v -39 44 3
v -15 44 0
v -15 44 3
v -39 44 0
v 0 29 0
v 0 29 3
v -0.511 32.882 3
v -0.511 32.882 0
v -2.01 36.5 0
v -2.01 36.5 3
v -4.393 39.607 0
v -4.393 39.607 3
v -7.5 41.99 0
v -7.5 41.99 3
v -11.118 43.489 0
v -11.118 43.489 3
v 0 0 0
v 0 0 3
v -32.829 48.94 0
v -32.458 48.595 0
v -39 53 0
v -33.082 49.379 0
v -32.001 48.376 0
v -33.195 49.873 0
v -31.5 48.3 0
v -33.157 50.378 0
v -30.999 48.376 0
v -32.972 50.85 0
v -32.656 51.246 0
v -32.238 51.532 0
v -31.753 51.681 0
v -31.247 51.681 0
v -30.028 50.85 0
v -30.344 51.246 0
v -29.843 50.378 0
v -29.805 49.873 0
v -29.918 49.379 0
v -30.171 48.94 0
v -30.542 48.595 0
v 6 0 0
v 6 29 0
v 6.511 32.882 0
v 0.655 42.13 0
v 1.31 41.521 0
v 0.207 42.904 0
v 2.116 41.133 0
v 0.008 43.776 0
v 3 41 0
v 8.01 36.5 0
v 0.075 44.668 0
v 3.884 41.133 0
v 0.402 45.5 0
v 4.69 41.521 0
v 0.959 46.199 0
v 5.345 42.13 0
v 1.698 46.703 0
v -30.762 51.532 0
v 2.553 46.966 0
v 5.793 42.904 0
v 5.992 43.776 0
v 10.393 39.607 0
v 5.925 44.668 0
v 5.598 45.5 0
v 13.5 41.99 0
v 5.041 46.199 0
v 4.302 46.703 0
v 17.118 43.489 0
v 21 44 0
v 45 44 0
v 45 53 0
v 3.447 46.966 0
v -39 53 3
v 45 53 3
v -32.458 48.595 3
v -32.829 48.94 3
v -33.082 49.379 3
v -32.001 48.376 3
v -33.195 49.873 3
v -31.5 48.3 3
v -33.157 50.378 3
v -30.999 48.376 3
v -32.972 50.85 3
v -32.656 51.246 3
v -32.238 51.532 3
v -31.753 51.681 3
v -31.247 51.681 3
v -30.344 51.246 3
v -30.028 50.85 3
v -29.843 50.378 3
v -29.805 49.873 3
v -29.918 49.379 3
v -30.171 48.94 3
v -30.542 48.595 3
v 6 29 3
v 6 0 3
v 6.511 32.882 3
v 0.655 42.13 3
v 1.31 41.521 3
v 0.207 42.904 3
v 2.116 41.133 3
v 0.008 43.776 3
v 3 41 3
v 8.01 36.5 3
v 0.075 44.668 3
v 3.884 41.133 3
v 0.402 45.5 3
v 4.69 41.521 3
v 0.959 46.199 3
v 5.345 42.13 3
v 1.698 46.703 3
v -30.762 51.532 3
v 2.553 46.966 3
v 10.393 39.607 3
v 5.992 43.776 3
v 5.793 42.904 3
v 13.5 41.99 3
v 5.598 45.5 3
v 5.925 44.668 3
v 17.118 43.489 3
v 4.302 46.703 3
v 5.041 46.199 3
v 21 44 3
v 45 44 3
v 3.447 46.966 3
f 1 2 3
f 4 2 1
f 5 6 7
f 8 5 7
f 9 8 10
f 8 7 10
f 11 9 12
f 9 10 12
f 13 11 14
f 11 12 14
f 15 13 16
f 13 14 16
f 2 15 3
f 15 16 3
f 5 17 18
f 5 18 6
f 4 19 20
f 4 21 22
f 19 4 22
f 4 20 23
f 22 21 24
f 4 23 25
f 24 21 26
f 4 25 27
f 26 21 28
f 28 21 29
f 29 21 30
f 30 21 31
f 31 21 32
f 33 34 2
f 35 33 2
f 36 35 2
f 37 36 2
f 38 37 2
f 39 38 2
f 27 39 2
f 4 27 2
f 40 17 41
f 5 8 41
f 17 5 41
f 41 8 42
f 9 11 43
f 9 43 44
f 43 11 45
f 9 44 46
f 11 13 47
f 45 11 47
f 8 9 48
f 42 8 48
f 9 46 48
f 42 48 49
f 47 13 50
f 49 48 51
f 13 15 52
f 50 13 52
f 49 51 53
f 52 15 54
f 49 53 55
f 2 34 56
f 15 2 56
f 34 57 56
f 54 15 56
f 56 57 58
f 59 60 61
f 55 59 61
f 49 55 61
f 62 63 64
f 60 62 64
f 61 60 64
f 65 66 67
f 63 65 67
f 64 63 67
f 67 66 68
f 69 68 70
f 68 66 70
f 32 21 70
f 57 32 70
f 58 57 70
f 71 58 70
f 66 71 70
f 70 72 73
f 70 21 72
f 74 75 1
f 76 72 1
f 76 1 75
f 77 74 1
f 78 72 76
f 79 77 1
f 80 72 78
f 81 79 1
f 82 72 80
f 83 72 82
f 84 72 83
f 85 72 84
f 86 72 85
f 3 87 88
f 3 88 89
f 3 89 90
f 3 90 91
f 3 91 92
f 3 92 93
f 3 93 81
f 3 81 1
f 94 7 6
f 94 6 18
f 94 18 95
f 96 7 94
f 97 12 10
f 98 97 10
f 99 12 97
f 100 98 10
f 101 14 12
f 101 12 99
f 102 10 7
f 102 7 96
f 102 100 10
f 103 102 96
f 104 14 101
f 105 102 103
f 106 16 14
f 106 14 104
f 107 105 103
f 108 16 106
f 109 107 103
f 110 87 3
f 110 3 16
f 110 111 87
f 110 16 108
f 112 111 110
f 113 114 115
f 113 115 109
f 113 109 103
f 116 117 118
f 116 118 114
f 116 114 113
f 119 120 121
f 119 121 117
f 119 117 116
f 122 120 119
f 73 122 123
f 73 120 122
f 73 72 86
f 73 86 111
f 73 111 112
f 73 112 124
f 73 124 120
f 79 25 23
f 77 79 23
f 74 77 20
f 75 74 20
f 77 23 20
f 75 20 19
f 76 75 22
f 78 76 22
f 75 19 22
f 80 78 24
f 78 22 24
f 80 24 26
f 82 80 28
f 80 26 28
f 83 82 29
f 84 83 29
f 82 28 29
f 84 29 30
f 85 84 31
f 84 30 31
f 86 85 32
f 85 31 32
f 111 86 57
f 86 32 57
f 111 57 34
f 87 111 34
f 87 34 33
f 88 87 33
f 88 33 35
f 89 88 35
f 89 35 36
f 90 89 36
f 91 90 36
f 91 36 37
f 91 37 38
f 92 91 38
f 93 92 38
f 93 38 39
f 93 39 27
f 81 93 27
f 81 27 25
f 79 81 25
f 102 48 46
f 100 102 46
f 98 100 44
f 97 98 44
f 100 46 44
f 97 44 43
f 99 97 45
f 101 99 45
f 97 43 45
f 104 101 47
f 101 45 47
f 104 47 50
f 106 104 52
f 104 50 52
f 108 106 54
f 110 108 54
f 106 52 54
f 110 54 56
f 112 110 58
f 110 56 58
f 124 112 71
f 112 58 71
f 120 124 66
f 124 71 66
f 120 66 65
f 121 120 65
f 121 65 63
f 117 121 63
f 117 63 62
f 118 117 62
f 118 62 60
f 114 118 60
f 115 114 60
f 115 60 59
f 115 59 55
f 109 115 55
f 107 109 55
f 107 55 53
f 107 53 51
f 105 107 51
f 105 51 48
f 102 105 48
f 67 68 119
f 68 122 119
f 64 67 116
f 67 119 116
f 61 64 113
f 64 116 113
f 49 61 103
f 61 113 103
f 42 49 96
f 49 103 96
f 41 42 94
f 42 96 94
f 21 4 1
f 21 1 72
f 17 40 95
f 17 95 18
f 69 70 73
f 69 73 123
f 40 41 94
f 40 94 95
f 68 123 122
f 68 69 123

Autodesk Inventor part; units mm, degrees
ref_plane "YZ Plane" through (0, 0, 0) normal (1, 0, 0) x (0, 1, 0)
ref_plane "XZ Plane" through (0, 0, 0) normal (0, 1, 0) x (-1, 0, 0)
ref_plane "XY Plane" through (0, 0, 0) normal (0, 0, 1) x (1, 0, 0)
sketch "Sketch1" plane through (0, 0, 0) normal (0, 0, 1) x (1, 0, 0)
  line L0 (-39, 53) -> (6, 53)
  line L1 (6, 53) -> (6, 44)
  line L2 (6, 44) -> (-39, 44)
  line L3 (-39, 44) -> (-39, 53)
  line L4 (0, 44) -> (6, 44)
  line L5 (6, 44) -> (6, 0)
  line L6 (6, 0) -> (0, 0)
  line L7 (0, 0) -> (0, 44)
  line L8 (6, 53) -> (45, 53)
  line L9 (45, 53) -> (45, 44)
  line L10 (45, 44) -> (6, 44)
  line L11 (6, 44) -> (6, 53)
  dimension "d1" = 9
  dimension "d2" = 45
  dimension "d3" = 6
  dimension "d17" = 53
  dimension "d19" = 45
extrude "Extrusion1" add sketch "Sketch1" along normal blind 3
fillet "Fillet1" radius 15 2 edges at (0, 44, 1.5) (6, 44, 1.5)
sketch "Sketch2" plane through (0, 0, 3) normal (0, 0, 1) x (1, 0, 0)
  line L0 (45, 53) -> (-39, 53) projected
  line L1 (6, 0) -> (6, 29) projected
  point P0 (0, 0)
  point P1 (3, 44)
  point P2 (6, 44)
  point P3 (-15, 44)
  dimension "d20" = 3
hole "Hole1" at (3, 44, 3) direction (0, 0, -1) diameter 6 end through all
sketch "Sketch3" plane through (0, 0, 3) normal (0, 0, 1) x (1, 0, 0)
  line L0 (-39, 53) -> (-39, 44) projected
  line L1 (45, 53) -> (-39, 53) projected
  line L2 (45, 44) -> (45, 53) projected
  point P0 (0, 0)
  point P1 (-31.5, 50)
  point P2 (-39, 48.5)
  dimension "d29" = 3
  dimension "d31" = 7.5
hole "Hole2" at (-31.5, 50, 3) direction (0, 0, -1) diameter 3.4 end through all clearance for "Flat Head Machine Screw" size "M3" standard "Ansi Metric M Profile"
equation "\"d19\" = d2"
properties part number "Top_Separator Lever" material "Nylon 6/6"
